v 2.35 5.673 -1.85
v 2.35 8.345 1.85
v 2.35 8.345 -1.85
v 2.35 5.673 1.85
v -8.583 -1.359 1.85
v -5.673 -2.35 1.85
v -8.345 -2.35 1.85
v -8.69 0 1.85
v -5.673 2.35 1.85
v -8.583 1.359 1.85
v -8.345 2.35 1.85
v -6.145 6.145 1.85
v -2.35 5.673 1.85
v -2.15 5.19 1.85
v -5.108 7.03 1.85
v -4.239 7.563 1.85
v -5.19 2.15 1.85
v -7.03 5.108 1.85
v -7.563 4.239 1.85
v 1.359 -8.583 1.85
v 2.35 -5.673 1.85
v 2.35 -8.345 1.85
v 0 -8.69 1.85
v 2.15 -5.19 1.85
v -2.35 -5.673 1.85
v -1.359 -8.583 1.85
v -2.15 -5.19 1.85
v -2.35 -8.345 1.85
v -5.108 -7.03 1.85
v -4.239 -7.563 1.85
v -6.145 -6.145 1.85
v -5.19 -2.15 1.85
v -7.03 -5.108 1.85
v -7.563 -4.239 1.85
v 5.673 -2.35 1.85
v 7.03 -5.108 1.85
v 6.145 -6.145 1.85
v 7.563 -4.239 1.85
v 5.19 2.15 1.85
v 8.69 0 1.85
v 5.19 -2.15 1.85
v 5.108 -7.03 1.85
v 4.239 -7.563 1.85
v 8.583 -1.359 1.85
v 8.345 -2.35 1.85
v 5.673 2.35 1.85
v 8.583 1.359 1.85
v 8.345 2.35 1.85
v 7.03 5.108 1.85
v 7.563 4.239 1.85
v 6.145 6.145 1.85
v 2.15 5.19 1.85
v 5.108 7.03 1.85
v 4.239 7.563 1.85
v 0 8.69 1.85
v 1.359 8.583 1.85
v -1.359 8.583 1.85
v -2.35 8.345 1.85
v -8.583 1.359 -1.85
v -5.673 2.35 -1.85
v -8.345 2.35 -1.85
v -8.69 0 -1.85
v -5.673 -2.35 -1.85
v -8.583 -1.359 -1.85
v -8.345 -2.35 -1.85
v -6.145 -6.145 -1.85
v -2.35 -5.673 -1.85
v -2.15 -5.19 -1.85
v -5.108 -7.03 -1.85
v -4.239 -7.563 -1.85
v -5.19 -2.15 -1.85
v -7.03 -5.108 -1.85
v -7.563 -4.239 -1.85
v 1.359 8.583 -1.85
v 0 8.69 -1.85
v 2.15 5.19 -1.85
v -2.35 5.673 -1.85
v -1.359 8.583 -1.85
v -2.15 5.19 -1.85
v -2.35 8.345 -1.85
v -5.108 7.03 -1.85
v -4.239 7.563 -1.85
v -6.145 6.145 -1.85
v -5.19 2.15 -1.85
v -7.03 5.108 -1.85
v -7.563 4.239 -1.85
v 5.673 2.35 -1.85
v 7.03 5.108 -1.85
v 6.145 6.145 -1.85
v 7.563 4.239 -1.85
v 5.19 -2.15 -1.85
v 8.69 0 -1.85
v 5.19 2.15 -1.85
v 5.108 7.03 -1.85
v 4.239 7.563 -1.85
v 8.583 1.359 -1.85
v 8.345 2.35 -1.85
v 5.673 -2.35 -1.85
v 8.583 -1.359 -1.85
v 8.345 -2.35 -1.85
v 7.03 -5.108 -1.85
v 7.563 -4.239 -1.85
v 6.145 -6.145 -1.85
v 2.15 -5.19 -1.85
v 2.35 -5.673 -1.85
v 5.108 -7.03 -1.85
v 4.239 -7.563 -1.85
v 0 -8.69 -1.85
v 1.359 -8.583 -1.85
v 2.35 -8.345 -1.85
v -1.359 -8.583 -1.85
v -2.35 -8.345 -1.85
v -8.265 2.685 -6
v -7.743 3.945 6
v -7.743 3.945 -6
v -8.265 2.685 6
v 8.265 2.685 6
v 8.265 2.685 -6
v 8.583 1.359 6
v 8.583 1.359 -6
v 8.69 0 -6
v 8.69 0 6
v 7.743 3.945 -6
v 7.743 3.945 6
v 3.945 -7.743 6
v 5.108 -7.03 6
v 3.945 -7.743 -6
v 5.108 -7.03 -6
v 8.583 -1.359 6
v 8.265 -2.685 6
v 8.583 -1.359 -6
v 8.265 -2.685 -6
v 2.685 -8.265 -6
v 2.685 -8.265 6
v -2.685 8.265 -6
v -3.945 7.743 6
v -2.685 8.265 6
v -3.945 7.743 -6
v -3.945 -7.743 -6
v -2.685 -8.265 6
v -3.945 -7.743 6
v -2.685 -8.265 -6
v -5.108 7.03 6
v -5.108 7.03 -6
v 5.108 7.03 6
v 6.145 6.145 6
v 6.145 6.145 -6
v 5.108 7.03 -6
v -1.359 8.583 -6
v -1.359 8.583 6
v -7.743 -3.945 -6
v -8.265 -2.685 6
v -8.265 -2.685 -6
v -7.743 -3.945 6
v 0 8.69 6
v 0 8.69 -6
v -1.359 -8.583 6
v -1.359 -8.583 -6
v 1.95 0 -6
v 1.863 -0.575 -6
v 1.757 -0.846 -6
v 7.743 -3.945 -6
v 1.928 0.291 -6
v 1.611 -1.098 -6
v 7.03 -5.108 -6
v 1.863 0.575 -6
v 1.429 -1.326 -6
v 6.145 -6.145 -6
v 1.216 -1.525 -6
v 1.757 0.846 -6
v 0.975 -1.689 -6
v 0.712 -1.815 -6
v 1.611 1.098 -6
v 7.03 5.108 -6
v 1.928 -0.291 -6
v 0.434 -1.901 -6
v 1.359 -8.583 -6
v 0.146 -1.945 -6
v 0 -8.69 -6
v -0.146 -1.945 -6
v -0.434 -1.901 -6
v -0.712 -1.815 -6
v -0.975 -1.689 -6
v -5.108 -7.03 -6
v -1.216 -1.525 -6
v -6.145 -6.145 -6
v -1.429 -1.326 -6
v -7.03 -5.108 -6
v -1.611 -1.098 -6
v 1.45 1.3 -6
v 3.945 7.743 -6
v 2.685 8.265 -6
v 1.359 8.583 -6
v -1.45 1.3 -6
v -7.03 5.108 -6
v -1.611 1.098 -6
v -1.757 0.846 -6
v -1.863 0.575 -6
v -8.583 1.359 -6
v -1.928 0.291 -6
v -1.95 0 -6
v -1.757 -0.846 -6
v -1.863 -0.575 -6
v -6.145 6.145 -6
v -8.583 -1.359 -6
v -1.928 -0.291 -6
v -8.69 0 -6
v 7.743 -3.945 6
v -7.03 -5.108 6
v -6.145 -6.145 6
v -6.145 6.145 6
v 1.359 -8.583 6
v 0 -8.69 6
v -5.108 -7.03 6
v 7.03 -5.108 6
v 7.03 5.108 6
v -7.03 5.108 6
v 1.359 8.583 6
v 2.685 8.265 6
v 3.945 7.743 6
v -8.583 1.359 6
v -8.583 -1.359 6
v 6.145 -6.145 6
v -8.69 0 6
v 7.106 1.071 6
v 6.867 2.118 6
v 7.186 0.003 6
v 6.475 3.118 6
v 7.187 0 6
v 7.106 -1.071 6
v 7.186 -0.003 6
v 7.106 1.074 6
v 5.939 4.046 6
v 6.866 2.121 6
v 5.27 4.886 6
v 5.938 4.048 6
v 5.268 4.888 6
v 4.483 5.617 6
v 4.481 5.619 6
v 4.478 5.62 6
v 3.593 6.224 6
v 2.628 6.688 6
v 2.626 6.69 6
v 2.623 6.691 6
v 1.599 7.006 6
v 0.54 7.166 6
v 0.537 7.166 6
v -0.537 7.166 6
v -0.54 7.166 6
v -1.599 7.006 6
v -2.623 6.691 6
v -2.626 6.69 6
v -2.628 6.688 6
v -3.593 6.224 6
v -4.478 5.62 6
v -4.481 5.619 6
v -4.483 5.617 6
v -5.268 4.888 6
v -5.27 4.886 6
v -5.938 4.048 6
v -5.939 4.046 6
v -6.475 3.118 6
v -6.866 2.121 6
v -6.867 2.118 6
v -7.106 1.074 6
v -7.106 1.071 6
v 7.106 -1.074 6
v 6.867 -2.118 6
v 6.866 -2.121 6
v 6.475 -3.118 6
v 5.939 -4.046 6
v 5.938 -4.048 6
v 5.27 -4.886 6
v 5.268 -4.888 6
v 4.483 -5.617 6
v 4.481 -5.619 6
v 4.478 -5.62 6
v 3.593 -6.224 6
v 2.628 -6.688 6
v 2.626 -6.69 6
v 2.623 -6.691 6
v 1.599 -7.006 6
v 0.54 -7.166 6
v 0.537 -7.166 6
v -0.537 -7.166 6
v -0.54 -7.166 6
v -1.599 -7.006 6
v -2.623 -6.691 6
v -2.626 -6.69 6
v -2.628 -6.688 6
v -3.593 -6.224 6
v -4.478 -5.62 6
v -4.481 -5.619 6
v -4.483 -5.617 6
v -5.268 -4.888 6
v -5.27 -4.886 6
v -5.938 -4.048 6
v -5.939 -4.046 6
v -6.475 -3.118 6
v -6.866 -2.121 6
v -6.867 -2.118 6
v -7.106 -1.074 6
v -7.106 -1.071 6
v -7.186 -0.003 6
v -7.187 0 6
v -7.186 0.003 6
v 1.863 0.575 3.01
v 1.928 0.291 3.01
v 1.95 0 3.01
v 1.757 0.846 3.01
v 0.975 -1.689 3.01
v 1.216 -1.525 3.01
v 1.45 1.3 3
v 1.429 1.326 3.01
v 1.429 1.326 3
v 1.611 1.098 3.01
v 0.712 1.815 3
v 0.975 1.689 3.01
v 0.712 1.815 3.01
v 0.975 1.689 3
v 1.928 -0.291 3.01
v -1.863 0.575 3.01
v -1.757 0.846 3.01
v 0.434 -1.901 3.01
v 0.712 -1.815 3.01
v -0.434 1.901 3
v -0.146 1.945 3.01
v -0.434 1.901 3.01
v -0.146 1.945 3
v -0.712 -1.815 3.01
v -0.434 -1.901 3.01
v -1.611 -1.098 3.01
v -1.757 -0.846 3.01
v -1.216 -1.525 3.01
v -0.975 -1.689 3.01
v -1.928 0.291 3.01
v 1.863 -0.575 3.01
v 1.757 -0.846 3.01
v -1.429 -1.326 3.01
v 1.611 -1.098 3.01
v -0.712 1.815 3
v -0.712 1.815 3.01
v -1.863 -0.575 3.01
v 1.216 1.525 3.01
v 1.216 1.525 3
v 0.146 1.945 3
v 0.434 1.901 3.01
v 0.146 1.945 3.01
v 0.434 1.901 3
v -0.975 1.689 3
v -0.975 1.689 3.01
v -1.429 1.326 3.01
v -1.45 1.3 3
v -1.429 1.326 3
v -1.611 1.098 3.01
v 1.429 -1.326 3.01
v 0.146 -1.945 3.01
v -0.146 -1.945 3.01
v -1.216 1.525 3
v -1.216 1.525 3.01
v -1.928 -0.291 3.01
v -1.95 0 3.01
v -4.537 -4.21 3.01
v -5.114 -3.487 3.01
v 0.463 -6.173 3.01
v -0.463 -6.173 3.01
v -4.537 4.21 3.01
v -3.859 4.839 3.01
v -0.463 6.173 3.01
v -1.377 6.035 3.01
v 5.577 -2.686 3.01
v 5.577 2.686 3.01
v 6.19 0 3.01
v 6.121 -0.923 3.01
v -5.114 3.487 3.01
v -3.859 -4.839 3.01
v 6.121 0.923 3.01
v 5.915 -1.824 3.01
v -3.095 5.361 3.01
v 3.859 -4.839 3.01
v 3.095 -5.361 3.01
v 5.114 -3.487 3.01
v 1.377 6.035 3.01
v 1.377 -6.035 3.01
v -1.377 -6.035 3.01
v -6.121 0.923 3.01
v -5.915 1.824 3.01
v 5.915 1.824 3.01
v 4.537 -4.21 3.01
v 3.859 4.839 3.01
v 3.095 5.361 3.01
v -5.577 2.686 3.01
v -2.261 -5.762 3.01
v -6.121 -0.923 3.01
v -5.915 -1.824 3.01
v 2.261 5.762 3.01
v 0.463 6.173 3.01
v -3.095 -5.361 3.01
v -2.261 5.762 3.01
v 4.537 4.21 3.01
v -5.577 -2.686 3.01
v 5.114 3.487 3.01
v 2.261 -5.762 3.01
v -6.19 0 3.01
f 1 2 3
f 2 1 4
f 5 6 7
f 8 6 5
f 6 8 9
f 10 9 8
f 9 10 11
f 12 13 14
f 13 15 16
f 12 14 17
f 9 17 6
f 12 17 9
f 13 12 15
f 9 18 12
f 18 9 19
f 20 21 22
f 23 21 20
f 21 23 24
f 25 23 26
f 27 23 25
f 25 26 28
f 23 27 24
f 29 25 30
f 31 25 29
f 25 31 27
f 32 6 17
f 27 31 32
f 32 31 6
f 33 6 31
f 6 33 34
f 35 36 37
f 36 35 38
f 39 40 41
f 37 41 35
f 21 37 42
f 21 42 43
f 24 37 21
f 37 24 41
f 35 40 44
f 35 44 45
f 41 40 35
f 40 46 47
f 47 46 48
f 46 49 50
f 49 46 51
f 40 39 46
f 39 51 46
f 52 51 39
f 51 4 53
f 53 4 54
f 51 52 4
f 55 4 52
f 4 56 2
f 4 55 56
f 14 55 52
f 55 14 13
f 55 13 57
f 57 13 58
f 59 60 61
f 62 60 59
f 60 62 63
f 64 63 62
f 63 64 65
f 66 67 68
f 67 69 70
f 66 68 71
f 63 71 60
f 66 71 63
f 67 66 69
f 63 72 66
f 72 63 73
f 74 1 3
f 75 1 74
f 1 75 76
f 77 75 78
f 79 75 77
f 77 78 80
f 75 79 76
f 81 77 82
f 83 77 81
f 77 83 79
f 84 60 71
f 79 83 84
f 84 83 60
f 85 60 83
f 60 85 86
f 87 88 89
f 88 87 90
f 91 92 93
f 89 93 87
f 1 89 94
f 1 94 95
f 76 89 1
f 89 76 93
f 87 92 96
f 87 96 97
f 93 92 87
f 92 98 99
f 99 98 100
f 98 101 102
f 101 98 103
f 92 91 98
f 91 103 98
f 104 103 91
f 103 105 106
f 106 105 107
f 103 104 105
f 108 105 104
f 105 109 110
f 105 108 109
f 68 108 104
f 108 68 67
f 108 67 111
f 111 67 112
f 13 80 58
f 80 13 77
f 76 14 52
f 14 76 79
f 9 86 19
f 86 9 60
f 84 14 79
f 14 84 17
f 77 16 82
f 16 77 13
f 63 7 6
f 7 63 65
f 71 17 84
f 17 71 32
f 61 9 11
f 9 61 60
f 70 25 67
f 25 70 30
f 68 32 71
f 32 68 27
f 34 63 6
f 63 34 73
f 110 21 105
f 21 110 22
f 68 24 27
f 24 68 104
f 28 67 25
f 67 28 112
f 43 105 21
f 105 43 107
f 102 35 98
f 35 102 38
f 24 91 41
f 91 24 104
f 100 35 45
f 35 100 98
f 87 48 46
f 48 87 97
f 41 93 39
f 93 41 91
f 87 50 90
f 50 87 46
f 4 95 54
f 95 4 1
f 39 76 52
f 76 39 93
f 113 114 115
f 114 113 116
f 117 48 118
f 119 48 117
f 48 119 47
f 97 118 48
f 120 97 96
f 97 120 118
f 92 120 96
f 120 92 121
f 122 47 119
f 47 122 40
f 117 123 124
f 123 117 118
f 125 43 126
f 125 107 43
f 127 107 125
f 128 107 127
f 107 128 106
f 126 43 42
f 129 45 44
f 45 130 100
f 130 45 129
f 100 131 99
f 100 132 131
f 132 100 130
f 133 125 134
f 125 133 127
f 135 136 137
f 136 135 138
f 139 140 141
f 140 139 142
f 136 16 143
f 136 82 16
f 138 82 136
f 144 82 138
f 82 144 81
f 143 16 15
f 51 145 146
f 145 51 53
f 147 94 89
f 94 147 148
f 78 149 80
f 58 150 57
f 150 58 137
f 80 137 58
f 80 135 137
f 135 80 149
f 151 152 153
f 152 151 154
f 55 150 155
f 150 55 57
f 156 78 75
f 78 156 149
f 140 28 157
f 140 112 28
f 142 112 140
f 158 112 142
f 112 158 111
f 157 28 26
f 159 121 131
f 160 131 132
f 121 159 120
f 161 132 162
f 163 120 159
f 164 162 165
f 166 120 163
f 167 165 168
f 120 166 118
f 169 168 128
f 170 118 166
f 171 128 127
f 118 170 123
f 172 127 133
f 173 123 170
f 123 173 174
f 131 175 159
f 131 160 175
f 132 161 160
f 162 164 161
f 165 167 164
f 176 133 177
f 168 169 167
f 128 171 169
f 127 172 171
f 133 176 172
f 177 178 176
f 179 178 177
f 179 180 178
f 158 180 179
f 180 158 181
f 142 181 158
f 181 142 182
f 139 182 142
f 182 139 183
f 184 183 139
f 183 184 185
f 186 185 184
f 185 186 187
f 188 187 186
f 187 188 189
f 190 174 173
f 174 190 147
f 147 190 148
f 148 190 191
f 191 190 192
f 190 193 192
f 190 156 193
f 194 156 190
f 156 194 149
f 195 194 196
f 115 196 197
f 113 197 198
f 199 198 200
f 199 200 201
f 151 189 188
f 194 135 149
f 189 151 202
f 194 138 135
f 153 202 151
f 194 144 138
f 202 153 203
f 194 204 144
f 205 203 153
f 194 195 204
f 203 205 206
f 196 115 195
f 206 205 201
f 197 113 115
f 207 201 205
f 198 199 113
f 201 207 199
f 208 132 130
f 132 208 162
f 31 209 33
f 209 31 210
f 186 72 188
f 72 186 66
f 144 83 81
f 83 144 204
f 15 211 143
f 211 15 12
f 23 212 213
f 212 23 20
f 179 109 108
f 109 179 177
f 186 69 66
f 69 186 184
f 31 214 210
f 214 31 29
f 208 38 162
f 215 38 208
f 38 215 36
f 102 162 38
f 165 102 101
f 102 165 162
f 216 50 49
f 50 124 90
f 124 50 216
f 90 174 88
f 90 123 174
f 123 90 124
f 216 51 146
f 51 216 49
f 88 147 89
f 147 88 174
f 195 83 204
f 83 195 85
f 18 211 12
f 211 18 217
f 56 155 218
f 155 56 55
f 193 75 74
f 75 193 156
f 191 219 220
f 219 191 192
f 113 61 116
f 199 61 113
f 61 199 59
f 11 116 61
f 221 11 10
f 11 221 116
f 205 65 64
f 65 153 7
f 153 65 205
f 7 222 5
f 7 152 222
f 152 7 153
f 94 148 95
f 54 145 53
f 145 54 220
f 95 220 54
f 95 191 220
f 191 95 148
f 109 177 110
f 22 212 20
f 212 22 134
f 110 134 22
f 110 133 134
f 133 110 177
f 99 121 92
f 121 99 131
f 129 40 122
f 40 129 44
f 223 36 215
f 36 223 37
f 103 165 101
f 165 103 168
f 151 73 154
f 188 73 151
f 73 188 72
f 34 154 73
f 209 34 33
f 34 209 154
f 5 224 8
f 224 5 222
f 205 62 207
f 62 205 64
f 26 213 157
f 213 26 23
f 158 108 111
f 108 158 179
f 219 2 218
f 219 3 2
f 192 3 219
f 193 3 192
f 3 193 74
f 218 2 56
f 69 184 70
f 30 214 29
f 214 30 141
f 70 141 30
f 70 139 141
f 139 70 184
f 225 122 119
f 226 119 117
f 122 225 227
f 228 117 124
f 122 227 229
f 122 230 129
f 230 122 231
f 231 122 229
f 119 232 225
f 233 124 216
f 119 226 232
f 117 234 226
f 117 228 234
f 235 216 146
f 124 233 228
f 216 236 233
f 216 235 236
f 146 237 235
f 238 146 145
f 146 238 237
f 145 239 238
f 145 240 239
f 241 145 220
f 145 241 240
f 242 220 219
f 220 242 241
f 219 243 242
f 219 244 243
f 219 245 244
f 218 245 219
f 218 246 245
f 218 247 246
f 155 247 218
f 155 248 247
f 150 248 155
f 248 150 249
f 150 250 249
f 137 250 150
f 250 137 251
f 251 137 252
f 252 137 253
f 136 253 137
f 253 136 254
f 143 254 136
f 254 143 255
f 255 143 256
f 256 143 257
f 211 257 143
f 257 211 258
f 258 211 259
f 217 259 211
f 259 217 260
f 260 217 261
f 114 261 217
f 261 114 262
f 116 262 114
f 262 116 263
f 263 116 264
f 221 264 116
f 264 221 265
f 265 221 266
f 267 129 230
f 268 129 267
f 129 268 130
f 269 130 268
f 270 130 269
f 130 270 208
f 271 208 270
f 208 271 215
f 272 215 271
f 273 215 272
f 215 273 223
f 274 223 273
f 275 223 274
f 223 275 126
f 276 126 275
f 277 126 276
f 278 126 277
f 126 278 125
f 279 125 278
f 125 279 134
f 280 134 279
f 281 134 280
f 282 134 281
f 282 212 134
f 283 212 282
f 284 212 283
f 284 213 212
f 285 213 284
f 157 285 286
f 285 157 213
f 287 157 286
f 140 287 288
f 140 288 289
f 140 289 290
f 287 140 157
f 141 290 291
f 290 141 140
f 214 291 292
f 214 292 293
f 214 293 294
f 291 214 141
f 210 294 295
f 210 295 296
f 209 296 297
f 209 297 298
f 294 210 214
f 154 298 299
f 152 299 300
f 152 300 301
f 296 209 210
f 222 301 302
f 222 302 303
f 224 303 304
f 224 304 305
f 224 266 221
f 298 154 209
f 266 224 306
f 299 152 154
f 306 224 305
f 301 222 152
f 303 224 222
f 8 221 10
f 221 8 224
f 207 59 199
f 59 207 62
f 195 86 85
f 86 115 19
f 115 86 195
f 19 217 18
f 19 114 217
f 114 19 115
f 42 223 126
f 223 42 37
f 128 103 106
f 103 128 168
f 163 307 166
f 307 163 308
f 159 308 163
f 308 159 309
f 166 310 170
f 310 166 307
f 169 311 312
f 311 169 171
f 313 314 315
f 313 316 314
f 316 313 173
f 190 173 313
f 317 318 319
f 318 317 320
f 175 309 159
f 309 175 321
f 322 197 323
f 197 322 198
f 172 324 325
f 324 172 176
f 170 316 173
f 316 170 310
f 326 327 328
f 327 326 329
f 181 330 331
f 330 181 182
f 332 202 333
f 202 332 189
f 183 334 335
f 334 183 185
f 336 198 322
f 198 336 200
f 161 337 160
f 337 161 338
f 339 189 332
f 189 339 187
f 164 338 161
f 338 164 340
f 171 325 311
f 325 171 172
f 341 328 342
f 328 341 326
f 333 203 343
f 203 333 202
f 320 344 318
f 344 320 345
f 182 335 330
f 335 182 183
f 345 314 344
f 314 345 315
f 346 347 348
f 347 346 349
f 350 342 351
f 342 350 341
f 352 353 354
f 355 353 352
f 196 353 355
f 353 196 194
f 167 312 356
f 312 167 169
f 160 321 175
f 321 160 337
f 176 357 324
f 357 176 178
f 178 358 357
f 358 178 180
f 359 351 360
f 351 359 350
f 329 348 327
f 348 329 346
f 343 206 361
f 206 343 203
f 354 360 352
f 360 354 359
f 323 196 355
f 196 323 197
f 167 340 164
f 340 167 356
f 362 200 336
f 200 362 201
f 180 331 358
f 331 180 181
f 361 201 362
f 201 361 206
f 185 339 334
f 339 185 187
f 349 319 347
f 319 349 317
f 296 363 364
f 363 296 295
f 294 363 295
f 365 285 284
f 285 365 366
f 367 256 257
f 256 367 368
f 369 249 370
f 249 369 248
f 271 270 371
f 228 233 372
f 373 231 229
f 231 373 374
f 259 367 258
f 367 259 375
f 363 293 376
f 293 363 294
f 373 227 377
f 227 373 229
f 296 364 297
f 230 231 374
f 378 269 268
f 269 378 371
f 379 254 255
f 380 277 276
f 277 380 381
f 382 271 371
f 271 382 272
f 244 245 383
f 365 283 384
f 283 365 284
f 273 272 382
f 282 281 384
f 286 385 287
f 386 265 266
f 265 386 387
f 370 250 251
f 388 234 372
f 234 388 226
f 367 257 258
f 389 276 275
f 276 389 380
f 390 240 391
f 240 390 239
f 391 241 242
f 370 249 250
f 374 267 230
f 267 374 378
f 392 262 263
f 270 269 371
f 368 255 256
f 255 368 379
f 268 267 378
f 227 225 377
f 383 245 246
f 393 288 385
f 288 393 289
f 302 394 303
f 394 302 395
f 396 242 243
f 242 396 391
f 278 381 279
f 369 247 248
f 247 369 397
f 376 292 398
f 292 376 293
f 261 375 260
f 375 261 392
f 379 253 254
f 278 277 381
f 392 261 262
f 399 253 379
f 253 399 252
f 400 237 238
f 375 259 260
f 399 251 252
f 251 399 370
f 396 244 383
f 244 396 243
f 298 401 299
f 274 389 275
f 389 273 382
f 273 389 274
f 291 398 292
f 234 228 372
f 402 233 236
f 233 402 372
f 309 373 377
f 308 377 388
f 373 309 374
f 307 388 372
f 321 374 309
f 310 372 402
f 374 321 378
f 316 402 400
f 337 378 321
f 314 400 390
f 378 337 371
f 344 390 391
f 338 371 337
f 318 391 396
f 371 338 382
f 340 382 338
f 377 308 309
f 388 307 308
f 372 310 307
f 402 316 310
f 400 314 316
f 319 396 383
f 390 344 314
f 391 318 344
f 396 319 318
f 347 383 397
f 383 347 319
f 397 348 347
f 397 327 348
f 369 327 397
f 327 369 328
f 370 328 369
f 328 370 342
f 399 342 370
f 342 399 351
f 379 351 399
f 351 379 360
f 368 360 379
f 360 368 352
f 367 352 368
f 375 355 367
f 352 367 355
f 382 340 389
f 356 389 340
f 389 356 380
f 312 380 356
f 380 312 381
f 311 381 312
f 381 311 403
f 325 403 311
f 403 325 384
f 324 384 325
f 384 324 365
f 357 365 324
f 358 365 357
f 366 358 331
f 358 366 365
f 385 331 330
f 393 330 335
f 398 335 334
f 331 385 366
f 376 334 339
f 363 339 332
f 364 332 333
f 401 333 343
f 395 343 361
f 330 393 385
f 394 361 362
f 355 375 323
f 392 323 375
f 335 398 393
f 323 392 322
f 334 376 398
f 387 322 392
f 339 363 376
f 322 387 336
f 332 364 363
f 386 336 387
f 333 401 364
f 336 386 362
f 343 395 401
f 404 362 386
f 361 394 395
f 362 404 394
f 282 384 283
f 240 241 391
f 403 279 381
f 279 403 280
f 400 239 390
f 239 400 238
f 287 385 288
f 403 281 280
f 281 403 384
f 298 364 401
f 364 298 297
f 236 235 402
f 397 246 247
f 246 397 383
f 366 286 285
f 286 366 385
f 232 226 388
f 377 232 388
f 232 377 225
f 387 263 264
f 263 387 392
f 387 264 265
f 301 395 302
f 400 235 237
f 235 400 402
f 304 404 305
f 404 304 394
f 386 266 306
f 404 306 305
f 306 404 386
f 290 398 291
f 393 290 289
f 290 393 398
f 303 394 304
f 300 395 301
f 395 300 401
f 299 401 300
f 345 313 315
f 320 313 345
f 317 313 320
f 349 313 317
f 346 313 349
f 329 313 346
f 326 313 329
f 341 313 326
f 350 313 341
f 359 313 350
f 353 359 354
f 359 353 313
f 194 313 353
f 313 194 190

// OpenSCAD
z = 8;
t = 7.8;
d = (z-1)*t/3.14159265359;
w = 3.7;
b = 4;

echo(d);


difference(){
  translate([0,0,-12/2])cylinder(r=d/2, h=12, $fn=40);
  translate([0,0,-14/2])cylinder(r=3.9/2, h=14, $fn=42);

    translate([0,0,12/2+0.01]){
      hull(){
        translate([0,0,0])cylinder(r=(d-3)/2, h=0.1, $fn=42);
        translate([0,0,0-3])cylinder(r=(d-5)/2, h=1, $fn=42);
      }
    }



  for ( i = [0 : 1 : z] ){
    
    delta = (360/z);
    
    rotate( i * delta, [0, 0, 1])
    translate([-(b+0.7)/2,d/2-3.5,-w/2])cube([b+0.7,d+10,w]);
}

}

translate([-3/2,-3/2+2.8,-12/2])cube([3,3,9]);
